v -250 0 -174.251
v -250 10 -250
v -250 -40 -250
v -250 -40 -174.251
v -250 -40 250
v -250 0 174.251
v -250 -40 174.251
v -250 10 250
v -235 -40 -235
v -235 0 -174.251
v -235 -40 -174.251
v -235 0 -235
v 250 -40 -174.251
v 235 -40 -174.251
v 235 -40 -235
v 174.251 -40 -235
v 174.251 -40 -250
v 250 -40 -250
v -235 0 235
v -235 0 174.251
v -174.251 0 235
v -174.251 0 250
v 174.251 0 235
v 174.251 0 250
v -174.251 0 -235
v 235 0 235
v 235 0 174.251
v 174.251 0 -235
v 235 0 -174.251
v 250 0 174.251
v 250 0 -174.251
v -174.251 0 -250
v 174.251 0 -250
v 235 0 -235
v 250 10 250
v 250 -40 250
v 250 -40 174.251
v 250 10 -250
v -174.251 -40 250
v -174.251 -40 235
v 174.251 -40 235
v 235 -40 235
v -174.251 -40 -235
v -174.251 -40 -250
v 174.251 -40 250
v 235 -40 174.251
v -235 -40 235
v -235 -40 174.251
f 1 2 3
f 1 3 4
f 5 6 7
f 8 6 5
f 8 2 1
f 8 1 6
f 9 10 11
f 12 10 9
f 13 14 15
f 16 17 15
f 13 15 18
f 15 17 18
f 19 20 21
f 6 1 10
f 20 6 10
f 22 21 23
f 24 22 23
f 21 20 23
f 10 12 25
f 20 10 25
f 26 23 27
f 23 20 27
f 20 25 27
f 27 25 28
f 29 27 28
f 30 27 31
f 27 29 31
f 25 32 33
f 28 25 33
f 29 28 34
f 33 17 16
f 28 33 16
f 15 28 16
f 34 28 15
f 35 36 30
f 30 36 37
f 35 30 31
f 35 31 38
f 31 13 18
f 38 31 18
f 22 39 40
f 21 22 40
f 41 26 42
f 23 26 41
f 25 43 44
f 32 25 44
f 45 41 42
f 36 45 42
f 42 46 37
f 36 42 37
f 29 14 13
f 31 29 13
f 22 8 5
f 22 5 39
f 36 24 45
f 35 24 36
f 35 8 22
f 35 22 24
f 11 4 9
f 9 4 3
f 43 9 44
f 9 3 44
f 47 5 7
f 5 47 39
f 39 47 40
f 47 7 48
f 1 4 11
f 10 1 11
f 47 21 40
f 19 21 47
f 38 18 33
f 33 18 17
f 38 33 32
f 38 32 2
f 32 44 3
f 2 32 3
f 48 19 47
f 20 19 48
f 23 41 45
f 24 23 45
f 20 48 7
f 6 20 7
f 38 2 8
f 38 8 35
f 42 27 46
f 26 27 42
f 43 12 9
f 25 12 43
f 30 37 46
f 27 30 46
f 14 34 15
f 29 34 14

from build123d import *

# Parameters (mm, degrees)
SKETCH2_W           = 500
SKETCH2_H           = 500
BOSS_EXTRUDE1_DEPTH = 10
BOSS_EXTRUDE2_DEPTH = 40


with BuildPart() as part:
    # Sketch2 → Boss-Extrude1 (new body)
    with BuildSketch(Plane(origin=(0, 0, 0), x_dir=(1, 0, 0), z_dir=(0, 1, 0))):
        Rectangle(SKETCH2_W, SKETCH2_H)
    extrude(amount=BOSS_EXTRUDE1_DEPTH)

    # Sketch2<3> → Boss-Extrude2 (add)
    with BuildSketch(Plane(origin=(0, 0, 0), x_dir=(1, 0, 0), z_dir=(0, 1, 0))):
        Polygon((-250, -174.250613401), (-250, -250), (-174.250613401, -250), (-174.250613401, -235), (-235, -235), (-235, -174.250613401), align=None)
        Polygon((174.250613401, -235), (174.250613401, -250), (250, -250), (250, -174.250613401), (235, -174.250613401), (235, -235), align=None)
        Polygon((-250, 250), (-250, 174.250613401), (-235, 174.250613401), (-235, 235), (-174.250613401, 235), (-174.250613401, 250), align=None)
        Polygon((235, 174.250613401), (250, 174.250613401), (250, 250), (174.250613401, 250), (174.250613401, 235), (235, 235), align=None)
    extrude(amount=-BOSS_EXTRUDE2_DEPTH)


solid = part.part
